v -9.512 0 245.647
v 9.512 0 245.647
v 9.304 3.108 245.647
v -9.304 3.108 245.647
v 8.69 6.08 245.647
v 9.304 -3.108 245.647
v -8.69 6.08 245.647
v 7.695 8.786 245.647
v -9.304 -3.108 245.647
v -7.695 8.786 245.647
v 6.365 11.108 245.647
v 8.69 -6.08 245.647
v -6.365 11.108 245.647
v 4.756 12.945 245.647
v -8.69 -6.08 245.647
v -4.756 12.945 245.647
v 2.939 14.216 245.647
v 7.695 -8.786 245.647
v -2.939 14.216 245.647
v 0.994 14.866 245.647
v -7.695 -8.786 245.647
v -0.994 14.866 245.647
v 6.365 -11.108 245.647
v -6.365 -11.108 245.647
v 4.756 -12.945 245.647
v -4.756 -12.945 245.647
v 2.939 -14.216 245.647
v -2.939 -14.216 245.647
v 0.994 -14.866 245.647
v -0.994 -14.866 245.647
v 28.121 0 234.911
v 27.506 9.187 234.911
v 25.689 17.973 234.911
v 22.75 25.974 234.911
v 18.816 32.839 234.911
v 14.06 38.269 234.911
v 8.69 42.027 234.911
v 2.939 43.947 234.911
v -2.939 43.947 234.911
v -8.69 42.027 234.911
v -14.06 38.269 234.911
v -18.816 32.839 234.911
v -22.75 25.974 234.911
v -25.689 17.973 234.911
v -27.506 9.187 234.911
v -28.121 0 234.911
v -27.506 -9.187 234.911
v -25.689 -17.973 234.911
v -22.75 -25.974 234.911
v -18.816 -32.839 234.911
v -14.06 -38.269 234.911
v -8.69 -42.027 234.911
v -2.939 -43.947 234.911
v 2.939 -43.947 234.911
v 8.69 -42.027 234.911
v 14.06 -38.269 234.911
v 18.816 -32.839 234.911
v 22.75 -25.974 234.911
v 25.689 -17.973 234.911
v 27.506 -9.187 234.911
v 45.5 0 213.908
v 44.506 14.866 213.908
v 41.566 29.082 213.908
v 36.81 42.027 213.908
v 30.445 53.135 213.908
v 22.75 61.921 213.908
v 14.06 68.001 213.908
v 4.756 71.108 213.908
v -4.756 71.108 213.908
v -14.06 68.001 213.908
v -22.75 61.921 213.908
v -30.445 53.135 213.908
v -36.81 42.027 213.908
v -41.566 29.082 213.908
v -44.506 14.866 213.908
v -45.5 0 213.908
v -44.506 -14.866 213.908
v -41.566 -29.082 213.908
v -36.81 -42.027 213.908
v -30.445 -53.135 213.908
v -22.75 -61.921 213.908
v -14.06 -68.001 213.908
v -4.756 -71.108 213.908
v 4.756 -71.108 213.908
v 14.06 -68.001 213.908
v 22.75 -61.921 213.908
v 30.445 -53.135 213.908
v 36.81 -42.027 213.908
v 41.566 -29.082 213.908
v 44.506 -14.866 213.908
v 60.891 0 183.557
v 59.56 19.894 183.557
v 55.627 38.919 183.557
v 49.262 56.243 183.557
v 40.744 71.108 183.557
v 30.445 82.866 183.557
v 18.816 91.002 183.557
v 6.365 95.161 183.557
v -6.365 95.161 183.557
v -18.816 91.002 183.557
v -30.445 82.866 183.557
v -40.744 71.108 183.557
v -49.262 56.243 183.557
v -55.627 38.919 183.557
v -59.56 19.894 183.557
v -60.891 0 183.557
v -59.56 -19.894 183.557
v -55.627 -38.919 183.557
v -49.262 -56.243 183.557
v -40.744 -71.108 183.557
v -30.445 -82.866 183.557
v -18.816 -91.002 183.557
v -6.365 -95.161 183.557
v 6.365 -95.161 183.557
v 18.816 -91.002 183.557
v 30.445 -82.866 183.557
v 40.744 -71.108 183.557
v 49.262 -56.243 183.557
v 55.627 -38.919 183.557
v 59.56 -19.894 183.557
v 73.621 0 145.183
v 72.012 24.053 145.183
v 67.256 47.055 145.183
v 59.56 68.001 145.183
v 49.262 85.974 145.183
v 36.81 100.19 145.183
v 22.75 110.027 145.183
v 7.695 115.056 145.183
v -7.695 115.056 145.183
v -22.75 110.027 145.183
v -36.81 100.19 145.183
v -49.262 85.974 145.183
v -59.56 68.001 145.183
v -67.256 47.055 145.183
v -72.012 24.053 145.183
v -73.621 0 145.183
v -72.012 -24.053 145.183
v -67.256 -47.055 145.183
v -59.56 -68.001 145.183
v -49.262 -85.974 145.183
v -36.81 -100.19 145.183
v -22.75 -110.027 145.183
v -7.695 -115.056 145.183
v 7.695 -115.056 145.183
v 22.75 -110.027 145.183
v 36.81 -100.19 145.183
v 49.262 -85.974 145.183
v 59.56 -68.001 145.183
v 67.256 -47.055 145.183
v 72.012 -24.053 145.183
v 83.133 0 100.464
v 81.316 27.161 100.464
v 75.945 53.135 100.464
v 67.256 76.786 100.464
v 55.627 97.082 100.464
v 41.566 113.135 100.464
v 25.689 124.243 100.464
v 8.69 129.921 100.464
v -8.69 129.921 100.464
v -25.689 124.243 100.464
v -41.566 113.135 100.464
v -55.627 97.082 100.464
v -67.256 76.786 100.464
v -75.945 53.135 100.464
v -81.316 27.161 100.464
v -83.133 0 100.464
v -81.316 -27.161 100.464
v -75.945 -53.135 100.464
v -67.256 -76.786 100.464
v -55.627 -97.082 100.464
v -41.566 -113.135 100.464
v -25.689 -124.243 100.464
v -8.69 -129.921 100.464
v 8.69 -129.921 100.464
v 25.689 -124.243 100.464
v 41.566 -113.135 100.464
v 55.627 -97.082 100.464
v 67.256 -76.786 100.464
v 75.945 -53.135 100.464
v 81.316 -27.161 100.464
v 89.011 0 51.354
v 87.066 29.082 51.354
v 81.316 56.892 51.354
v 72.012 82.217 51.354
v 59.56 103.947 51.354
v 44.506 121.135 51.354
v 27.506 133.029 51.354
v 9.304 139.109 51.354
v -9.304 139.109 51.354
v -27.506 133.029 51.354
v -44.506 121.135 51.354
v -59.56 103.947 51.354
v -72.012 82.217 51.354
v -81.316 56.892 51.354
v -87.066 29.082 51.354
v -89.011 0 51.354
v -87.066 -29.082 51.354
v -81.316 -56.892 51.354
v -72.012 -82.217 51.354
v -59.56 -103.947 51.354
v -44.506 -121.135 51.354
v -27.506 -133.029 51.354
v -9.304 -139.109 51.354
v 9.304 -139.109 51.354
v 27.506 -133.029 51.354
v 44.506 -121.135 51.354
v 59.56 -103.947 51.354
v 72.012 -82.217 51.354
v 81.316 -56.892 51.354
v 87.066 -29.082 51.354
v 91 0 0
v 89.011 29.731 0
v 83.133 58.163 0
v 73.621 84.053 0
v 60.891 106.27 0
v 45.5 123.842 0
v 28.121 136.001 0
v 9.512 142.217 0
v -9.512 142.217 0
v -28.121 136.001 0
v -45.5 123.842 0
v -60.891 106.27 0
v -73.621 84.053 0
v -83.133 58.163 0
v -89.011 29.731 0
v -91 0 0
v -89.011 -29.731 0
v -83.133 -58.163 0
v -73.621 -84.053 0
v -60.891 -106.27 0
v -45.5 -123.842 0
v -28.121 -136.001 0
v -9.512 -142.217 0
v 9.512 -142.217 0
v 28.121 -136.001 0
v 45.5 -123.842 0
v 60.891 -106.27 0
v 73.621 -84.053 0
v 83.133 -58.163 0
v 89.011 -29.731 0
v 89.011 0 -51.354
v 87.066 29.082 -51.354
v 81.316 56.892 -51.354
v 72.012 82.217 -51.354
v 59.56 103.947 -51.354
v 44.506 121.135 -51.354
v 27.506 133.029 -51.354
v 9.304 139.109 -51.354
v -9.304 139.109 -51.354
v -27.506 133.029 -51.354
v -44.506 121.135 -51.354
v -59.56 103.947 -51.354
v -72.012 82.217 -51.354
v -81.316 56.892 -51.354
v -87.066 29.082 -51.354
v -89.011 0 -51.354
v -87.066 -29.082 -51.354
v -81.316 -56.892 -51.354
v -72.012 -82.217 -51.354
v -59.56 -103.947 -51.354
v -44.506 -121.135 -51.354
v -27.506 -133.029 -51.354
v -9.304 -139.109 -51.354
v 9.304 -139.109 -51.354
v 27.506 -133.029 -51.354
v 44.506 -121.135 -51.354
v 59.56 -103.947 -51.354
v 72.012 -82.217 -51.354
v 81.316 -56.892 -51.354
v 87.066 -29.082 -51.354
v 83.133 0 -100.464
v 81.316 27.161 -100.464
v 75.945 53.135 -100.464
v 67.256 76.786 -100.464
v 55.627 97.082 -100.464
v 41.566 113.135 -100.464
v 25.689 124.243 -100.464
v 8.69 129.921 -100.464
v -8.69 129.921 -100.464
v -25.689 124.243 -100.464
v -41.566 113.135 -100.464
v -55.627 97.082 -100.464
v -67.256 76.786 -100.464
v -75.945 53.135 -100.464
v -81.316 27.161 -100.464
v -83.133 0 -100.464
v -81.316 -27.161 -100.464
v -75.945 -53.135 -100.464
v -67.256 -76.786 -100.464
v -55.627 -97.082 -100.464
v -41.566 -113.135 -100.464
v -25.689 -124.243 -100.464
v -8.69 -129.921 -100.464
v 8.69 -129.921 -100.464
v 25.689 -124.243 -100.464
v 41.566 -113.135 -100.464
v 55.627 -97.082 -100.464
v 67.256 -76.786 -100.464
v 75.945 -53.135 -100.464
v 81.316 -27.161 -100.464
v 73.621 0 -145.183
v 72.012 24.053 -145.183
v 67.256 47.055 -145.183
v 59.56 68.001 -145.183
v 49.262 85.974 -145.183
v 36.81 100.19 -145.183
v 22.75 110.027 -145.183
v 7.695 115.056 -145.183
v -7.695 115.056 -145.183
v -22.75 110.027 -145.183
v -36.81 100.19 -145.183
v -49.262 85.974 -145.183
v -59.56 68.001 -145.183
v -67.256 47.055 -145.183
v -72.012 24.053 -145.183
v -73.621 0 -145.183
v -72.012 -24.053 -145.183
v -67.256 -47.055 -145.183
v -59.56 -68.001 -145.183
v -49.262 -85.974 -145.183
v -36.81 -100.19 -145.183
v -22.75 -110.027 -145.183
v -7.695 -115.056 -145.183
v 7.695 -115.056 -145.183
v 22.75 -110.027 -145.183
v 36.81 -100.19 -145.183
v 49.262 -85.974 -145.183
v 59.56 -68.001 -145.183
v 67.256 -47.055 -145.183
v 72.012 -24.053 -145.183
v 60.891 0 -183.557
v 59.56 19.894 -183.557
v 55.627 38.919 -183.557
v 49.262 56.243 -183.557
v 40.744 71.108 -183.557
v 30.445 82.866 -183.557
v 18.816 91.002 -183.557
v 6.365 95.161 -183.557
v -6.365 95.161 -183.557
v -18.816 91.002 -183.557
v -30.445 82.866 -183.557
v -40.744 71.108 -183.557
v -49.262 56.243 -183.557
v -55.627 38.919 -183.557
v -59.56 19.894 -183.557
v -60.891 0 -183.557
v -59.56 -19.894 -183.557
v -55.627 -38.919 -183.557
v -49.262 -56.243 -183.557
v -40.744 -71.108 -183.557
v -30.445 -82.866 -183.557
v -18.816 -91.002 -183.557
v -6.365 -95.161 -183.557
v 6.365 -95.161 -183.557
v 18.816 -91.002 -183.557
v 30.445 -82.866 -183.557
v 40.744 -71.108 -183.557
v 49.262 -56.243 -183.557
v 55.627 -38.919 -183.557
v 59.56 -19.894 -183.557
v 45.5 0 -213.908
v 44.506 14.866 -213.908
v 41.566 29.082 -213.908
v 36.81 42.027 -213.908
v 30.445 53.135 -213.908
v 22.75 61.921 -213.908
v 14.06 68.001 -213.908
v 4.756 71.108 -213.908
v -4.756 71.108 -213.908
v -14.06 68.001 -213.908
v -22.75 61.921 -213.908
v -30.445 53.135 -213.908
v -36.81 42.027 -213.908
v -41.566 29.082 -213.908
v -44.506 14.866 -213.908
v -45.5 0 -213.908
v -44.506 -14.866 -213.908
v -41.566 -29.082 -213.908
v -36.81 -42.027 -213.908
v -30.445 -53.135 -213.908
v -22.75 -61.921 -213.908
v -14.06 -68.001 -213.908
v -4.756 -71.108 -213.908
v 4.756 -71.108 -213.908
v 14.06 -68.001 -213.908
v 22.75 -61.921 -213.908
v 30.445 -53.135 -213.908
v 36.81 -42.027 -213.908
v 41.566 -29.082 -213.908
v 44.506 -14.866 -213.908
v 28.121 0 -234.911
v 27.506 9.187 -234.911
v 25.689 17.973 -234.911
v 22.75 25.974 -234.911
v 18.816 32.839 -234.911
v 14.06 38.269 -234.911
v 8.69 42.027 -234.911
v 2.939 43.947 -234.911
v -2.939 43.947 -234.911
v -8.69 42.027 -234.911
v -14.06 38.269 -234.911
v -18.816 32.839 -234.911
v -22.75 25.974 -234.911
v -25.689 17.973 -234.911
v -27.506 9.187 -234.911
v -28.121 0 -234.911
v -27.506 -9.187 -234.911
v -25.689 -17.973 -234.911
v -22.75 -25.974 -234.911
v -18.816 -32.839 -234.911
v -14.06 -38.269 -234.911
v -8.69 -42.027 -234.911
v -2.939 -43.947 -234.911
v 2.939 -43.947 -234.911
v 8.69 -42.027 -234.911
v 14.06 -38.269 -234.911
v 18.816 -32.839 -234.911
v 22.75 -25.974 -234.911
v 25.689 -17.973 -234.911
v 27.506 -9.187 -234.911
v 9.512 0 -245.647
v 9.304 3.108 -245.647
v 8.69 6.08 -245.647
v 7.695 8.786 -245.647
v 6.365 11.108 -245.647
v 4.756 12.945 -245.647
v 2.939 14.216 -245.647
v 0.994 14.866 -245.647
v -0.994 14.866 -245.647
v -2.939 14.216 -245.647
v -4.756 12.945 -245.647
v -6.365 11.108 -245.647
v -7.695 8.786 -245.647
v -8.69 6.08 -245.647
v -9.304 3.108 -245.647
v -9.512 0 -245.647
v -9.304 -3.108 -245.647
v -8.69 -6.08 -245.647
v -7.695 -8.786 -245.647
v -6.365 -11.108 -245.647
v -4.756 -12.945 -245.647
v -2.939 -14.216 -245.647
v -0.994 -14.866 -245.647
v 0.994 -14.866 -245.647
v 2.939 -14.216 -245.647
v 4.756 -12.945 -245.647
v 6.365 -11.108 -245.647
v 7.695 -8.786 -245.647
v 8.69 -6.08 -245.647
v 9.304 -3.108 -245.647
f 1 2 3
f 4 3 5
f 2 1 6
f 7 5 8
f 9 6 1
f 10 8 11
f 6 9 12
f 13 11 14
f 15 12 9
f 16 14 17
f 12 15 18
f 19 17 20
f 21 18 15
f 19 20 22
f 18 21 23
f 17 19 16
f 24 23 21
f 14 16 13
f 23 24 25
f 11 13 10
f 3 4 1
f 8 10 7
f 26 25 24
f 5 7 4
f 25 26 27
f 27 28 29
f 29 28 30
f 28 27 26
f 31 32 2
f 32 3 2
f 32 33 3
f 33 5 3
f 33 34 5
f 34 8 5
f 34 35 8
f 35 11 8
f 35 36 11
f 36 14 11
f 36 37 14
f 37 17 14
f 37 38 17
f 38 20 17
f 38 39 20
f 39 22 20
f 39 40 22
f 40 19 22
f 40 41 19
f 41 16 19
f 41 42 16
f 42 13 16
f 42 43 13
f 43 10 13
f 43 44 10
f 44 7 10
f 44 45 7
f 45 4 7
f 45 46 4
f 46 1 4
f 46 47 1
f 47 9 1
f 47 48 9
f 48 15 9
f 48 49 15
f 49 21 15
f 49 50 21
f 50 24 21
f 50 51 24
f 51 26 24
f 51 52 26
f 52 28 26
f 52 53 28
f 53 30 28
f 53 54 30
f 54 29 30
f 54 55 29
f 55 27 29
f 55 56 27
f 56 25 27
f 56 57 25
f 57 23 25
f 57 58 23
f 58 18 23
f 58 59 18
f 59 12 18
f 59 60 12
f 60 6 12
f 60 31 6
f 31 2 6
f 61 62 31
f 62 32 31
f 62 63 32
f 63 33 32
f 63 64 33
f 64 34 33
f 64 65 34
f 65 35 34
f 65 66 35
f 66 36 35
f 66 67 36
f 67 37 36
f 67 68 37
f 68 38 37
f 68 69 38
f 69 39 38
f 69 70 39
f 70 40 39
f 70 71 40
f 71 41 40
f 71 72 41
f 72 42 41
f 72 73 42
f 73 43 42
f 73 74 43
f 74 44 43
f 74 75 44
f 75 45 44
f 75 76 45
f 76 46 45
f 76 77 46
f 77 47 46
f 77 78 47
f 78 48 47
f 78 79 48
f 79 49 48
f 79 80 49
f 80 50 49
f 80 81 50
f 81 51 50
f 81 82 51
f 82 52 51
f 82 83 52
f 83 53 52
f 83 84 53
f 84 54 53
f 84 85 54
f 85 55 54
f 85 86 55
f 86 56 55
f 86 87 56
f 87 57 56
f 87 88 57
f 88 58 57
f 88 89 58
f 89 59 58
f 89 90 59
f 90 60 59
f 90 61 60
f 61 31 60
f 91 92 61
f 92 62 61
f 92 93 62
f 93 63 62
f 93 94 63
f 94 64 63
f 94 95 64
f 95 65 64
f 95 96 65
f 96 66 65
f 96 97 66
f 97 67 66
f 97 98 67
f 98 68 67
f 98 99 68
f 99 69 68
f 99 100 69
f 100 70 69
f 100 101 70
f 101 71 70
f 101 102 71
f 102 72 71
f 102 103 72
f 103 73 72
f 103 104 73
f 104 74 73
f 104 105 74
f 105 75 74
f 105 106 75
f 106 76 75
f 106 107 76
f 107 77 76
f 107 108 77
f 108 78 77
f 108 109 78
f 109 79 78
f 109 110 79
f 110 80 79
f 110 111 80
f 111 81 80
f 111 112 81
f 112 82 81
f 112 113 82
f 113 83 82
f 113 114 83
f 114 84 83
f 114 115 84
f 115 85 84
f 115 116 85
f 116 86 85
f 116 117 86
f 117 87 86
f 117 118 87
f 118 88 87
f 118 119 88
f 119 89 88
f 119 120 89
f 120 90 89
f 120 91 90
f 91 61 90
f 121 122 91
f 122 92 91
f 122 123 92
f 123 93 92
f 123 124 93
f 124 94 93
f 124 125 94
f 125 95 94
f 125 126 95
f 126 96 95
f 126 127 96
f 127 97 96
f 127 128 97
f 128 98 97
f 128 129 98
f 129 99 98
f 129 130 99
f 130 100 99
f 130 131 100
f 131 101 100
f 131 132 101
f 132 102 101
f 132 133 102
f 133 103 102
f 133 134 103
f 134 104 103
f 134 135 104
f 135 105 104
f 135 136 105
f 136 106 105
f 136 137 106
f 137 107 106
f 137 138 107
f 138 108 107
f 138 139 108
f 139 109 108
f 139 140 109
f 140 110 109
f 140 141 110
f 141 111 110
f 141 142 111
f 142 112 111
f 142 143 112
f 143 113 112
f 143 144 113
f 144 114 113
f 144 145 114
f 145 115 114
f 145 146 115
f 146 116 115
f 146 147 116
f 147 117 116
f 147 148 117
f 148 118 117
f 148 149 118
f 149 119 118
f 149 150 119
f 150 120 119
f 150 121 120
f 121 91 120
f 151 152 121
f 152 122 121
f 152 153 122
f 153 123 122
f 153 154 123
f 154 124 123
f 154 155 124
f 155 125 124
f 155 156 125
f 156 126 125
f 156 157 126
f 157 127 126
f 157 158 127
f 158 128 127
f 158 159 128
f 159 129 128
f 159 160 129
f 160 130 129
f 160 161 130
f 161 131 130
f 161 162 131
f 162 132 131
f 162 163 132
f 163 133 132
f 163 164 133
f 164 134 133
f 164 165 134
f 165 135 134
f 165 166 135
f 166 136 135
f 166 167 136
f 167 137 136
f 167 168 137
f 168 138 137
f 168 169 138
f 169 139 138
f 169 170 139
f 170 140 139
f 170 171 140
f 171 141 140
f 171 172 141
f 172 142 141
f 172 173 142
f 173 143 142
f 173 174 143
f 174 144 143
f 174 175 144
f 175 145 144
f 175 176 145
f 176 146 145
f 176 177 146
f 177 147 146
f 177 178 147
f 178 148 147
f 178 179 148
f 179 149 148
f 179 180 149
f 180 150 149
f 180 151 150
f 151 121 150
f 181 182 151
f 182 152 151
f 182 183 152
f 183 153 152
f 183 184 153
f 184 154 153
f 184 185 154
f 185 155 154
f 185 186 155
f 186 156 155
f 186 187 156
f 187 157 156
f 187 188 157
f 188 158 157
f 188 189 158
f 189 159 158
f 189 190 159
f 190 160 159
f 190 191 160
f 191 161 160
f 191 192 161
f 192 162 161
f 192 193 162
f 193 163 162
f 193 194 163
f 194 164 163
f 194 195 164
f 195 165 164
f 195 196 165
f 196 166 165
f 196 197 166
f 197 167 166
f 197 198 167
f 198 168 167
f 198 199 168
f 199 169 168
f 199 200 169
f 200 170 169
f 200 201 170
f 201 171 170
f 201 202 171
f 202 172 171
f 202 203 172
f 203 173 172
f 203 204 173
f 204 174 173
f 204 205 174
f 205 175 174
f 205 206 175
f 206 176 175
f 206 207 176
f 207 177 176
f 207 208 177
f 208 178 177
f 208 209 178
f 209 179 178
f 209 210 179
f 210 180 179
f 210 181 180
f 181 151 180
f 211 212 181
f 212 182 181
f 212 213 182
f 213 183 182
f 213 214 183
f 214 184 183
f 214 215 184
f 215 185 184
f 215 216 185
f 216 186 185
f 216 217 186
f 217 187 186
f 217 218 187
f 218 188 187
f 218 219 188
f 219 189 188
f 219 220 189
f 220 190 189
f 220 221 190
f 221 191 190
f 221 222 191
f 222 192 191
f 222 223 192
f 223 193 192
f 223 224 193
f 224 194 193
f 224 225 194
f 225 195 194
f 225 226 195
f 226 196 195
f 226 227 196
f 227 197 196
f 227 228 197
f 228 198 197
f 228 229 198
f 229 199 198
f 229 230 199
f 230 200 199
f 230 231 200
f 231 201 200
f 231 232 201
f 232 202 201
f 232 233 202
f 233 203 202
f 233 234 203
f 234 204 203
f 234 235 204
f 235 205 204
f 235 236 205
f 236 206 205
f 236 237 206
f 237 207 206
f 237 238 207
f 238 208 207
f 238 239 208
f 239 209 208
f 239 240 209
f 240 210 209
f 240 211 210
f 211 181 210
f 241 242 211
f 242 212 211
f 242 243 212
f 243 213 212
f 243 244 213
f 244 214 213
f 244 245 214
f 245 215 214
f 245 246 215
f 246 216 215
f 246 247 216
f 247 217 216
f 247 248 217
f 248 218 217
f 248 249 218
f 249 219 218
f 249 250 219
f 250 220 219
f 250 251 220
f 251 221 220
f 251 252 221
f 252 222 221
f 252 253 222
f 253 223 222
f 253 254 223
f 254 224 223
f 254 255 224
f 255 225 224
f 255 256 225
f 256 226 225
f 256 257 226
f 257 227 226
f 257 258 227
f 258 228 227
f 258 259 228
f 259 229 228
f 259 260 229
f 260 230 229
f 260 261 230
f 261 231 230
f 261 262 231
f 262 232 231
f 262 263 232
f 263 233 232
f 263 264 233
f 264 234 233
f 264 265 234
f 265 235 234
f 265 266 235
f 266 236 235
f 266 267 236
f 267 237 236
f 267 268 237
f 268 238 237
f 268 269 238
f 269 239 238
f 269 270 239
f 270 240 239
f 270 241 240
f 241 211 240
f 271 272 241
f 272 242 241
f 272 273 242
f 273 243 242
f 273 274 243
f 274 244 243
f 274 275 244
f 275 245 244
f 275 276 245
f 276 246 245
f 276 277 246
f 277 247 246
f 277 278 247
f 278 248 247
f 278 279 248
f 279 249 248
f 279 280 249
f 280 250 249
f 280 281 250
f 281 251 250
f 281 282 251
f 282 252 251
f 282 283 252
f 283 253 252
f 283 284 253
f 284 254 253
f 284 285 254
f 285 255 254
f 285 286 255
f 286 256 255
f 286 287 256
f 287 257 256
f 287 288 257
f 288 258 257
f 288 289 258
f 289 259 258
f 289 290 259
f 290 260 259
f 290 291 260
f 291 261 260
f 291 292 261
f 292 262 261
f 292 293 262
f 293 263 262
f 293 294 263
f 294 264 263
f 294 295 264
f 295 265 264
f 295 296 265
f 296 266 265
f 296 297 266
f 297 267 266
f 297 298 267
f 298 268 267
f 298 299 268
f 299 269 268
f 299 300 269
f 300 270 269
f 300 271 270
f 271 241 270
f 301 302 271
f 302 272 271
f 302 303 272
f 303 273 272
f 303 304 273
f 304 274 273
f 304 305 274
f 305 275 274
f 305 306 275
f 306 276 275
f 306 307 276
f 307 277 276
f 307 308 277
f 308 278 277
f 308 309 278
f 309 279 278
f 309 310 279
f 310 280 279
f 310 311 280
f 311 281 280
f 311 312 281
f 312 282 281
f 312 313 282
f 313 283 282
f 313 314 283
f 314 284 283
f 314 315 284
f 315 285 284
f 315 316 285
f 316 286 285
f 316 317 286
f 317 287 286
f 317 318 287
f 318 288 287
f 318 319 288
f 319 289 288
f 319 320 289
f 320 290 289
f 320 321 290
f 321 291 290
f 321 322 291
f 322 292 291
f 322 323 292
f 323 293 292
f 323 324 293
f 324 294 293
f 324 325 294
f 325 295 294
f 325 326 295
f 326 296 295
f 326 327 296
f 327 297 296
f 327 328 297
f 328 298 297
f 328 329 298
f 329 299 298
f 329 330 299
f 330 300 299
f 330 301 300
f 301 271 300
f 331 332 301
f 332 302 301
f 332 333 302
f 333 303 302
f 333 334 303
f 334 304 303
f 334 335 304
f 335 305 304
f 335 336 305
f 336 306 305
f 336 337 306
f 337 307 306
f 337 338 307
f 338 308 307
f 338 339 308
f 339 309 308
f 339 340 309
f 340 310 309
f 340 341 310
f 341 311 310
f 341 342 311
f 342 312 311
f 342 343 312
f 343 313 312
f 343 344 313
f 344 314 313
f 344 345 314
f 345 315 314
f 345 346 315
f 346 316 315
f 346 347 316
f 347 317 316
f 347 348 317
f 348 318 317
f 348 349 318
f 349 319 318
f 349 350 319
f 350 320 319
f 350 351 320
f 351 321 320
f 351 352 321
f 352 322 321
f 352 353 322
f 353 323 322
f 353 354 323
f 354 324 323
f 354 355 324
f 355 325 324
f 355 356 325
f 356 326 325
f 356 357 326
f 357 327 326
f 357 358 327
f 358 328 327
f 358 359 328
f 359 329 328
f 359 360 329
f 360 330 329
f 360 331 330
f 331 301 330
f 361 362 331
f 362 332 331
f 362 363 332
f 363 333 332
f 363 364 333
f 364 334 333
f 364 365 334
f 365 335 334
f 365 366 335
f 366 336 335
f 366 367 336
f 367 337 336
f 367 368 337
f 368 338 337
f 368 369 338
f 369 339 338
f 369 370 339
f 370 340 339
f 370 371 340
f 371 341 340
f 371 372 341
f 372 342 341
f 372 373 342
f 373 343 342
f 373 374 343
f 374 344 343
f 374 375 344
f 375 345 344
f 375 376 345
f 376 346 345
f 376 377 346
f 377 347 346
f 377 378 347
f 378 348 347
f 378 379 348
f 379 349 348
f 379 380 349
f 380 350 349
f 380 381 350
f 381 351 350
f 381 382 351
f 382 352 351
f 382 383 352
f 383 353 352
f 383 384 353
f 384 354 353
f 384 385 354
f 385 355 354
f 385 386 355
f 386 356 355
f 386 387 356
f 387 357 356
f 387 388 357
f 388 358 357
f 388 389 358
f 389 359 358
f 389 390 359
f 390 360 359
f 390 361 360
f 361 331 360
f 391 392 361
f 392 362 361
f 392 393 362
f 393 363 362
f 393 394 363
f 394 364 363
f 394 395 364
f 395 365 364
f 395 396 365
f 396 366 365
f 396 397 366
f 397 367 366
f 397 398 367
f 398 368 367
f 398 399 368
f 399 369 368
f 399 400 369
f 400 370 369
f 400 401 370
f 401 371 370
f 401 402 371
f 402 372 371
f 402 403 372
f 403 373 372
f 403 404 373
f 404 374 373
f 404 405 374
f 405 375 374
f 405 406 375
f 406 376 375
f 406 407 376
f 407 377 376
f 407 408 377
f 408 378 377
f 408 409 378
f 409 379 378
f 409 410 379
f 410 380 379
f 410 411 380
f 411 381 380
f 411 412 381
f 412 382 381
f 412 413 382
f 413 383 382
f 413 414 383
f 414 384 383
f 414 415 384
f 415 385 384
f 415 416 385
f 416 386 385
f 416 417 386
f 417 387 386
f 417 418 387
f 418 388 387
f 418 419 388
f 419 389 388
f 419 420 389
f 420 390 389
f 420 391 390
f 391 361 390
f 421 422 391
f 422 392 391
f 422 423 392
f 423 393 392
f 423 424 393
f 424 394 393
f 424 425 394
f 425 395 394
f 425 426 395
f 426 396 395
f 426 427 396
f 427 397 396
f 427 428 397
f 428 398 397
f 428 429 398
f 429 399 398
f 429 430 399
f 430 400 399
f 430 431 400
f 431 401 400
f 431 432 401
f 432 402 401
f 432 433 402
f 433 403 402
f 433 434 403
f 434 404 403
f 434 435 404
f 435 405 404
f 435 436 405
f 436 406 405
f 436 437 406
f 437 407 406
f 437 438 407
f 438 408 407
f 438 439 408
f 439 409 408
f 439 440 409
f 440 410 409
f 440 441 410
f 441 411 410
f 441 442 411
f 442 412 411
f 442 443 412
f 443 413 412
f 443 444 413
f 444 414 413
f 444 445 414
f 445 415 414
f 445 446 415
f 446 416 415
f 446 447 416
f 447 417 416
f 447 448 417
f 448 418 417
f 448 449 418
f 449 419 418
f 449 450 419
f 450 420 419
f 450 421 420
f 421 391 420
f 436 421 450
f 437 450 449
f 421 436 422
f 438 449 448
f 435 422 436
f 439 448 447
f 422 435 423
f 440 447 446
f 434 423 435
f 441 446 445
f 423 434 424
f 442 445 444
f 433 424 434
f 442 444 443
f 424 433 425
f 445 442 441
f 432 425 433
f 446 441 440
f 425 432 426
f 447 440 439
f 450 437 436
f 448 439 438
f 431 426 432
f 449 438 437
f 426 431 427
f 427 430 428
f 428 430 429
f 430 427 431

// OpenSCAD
// Generated by SolidPython 1.0.1 on 2020-07-29 00:46:47


scale(v = [7, 11, 19]) {
	sphere(r = 13);
}
/***********************************************
*********      SolidPython code:      **********
************************************************
 
# import packages: SolidPython
from solid import *
from solid.utils import *
from itertools import chain, combinations, permutations


class Resize:

    def __init__(self, scad_file):
        self.scad_file = scad_file
        #self.scad_file = import_scad(scad_file)
        # cone/cylinder param:
        self.r1 = 0
        self.r2 = 0
        self.h = 0
        # rectangular prism param:
        self.w = 0
        self.l = 0
        # ellipse param:
        self.r = 0

    # import OpenScad code (file name corresponds to shape)


    # classify shape + parameters
    def assign(self, param1, param2, param3):
        if self.scad_file == 'cone.scad':
            self.r1 = param1
            self.r2 = param2
            self.h = param3
        elif self.scad_file == 'cylinder.scad':
            self.r1 = param1
            self.r2 = param2
            self.h = param3
        elif self.scad_file == 'rectangularPrism.scad':
            self.h = param1
            self.l = param2
            self.w = param3
        else:
            self.r = param1
            self.h = param2

    # resize parameters
    def iterate(self):
        x = range(3, 20, 2)
        i = 1
        if self.scad_file == 'cone.scad':
            tempList = list(permutations(x, 2))
            for temp in tempList:
                param1 = temp[0]
                param2 = temp[1]
                filepath = 'produced_scad_files/' + 'cone' + str(param1) + '_' + str(param2) + '_' + '.scad'
                scad_render_to_file(cylinder(h=param1, r1=param2, r2=0), filepath)

        elif self.scad_file == 'cylinder.scad':
            tempList = list(permutations(x, 3))
            for temp in tempList:
                param1 = temp[0]
                param2 = temp[1]
                filepath = 'produced_scad_files/' + 'cylinder' + str(param1) + '_' + str(param2) + '_' + '.scad'
                scad_render_to_file(cylinder(h=param1, r1=param2, r2=param2), filepath)

        elif self.scad_file == 'rectangularPrism.scad':
            tempList = list(permutations(x, 3))
            for temp in tempList:
                param1 = temp[0]
                param2 = temp[1]
                param3 = temp[2]
                filepath = 'produced_scad_files/' + 'rectangularPrism' + str(param1) + '_' + str(param2) + '_' + str(
                    param3) + '.scad'
                scad_render_to_file(cube(size=(param1, param2, param3)), filepath)

        elif self.scad_file == 'ellipse.scad':
            tempList = list(permutations(x, 4))
            for temp in tempList:
                param1 = temp[0]
                param2 = temp[1]
                param3 = temp[2]
                param4 = temp[3]
                filepath = 'produced_scad_files/' + 'ellipse' + str(param1) + '_' + str(param2) + '_' + str(param3) + '_' + str(param4) + '.scad'
                scad_render_to_file(scale([param1, param2, param3])(sphere(r=param4)), filepath)

    def render_to_scadfile(self):
        scad_render_to_file(scad, 'example.scad') 
 
************************************************/
